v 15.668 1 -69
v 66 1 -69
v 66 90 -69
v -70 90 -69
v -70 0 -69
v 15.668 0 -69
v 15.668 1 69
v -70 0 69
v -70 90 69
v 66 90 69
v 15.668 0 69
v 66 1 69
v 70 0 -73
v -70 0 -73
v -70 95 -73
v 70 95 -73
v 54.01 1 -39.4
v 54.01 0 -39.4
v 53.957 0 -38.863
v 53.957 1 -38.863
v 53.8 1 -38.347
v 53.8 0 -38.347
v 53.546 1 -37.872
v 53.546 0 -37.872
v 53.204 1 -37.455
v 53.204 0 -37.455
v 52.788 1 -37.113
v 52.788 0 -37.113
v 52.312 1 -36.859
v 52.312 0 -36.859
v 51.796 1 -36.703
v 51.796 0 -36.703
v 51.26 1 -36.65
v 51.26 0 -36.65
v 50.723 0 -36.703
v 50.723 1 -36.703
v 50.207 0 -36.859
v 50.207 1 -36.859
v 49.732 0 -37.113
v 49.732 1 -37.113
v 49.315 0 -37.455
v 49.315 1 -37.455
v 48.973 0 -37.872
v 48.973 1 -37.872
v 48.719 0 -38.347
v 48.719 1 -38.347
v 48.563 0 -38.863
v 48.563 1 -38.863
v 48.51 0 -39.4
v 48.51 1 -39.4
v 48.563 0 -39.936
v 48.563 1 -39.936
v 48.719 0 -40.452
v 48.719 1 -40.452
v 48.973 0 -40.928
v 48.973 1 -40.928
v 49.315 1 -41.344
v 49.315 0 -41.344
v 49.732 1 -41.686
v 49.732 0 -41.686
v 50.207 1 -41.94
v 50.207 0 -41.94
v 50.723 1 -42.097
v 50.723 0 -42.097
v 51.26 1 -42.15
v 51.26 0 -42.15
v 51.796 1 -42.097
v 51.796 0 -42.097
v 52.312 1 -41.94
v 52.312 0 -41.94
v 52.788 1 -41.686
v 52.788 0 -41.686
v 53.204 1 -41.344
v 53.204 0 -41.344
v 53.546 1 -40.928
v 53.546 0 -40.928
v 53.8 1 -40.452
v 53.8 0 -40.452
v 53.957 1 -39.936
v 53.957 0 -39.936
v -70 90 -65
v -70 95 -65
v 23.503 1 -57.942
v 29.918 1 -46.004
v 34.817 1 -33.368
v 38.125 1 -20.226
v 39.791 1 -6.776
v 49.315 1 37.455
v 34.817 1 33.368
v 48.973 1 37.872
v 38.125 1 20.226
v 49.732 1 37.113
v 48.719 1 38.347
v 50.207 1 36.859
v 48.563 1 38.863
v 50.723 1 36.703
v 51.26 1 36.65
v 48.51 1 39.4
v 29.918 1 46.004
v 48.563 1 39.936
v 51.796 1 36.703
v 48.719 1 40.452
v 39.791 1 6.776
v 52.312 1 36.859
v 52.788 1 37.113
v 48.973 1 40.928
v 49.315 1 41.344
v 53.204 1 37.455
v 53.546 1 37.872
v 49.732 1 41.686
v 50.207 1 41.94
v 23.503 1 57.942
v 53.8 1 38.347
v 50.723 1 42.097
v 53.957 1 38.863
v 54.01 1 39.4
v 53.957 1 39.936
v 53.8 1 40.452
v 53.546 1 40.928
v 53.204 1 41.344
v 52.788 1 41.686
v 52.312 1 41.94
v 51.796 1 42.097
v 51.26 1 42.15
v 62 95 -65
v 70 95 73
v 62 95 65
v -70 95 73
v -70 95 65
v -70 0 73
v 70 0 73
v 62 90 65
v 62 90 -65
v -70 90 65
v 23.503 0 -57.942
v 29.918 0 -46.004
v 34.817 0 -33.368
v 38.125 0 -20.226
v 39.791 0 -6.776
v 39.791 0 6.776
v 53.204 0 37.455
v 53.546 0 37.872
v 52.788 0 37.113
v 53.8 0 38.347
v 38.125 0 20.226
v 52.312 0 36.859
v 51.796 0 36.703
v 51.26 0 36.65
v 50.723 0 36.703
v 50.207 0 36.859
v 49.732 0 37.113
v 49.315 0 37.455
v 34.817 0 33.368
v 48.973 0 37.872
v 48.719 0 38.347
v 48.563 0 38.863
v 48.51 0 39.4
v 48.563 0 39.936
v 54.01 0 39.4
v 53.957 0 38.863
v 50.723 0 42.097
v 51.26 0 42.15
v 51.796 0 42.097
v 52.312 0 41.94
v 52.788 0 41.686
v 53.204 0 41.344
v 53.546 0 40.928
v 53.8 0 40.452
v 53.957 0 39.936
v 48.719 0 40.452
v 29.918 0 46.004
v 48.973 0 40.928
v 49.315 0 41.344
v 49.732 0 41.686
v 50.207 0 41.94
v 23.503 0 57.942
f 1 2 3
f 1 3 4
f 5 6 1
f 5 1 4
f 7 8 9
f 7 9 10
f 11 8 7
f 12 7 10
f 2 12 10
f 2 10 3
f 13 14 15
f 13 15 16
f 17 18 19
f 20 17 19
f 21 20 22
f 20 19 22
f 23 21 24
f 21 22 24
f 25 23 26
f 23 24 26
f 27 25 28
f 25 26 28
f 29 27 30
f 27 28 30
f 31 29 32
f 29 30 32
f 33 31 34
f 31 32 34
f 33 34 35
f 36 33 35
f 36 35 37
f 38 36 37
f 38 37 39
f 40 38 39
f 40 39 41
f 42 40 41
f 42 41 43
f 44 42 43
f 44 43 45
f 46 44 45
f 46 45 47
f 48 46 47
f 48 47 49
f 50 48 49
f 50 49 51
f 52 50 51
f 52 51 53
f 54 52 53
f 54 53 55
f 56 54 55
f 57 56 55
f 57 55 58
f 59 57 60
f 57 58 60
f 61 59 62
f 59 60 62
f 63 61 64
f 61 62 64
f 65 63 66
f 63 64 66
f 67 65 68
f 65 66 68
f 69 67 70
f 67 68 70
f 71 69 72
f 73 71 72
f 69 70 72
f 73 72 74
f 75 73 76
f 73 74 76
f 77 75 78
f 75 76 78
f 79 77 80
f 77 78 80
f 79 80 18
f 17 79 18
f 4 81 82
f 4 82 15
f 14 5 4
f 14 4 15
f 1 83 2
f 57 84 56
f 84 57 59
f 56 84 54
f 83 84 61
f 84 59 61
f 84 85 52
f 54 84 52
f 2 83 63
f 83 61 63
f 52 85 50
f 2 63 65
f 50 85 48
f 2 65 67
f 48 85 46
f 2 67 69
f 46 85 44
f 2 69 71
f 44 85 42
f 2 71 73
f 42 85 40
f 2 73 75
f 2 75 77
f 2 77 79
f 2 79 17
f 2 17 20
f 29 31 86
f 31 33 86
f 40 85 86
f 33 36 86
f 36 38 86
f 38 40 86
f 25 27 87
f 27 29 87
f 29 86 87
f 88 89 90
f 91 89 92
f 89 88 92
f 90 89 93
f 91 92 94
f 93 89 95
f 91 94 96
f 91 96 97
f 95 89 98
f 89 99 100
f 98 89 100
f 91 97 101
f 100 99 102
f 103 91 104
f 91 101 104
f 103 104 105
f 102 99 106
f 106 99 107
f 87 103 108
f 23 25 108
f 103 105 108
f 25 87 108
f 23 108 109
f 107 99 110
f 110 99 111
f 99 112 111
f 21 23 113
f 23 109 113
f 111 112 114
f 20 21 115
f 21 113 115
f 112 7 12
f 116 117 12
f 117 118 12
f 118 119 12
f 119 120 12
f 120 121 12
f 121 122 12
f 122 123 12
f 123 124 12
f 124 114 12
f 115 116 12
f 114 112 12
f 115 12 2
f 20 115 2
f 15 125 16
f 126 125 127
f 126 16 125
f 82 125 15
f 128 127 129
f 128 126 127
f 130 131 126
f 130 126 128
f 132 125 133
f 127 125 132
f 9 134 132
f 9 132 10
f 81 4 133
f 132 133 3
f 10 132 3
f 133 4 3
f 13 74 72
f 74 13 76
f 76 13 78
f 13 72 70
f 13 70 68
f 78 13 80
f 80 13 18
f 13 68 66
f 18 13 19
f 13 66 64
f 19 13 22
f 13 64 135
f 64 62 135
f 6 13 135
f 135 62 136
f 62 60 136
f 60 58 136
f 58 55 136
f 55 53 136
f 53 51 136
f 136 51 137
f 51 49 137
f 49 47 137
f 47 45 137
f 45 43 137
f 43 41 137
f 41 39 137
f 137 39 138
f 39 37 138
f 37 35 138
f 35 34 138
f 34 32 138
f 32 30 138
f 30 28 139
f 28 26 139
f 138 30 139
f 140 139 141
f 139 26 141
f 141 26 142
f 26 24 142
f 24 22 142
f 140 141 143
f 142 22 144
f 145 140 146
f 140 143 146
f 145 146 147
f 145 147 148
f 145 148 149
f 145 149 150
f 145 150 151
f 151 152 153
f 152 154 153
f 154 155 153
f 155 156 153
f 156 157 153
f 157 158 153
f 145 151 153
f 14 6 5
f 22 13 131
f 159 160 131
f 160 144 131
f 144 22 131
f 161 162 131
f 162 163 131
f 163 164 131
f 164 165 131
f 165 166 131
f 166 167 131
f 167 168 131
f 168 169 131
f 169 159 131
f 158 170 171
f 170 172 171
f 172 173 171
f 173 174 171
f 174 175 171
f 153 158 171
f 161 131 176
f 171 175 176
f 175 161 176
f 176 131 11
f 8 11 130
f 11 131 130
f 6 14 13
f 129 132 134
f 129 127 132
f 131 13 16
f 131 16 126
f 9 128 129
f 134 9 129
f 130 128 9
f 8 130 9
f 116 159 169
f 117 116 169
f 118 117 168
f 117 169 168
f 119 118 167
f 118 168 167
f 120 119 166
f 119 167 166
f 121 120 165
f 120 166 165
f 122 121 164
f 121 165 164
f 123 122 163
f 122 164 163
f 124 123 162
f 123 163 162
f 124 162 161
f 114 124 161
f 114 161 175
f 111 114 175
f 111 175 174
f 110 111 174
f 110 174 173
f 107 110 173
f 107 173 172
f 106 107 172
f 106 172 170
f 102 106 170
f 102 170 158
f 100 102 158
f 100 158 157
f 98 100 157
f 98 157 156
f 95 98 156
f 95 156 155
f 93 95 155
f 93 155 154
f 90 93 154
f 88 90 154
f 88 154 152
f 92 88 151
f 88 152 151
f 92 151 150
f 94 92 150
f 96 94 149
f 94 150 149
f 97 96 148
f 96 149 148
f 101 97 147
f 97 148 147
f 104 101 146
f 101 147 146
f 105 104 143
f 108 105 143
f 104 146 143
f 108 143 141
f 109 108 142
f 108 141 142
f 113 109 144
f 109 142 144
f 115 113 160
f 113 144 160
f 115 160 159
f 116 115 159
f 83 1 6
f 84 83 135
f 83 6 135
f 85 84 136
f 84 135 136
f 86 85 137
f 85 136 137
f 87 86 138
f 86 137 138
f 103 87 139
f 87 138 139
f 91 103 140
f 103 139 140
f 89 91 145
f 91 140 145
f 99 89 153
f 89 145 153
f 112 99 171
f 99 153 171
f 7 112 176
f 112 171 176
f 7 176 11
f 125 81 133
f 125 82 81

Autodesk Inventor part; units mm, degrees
ref_plane "YZ Plane" through (0, 0, 0) normal (1, 0, 0) x (0, 1, 0)
ref_plane "XZ Plane" through (0, 0, 0) normal (0, 1, 0) x (-1, 0, 0)
ref_plane "XY Plane" through (0, 0, 0) normal (0, 0, 1) x (1, 0, 0)
sketch "Sketch4" plane through (0, 0, 0) normal (0, 1, 0) x (-1, 0, 0)
  line L0 (-70, 73) -> (70, 73)
  line L1 (70, -73) -> (-70, -73)
  line L2 (-70, -73) -> (-70, 73)
  line L3 (-66, -69) -> (70, -69)
  line L4 (70, 69) -> (-66, 69)
  line L5 (-66, 69) -> (-66, -69)
  line L6 (70, 73) -> (70, 69)
  line L7 (70, -69) -> (70, -73)
  point P0 (0, 0)
  point P1 (-66, 65)
  dimension "Housing_Length" = 140
  dimension "Housing_Width" = 146
  dimension "d15" = 4
  dimension "d36" = 136
  dimension "d37" = 138
extrude "Extrusion4" add sketch "Sketch4" along normal blind 95
sketch "Sketch6" plane through (0, 95, 0) normal (0, 1, 0) x (1, 0, 0)
  line L0 (70, 73) -> (-70, 73) projected
  line L1 (-70, -69) -> (-70, -73) projected
  line L2 (70, 73) -> (-70, 73)
  line L3 (-70, 73) -> (-70, -73)
  line L4 (-70, -73) -> (70, -73)
  line L5 (70, -73) -> (70, 73)
  line L6 (62, -65) -> (-70, -65)
  line L7 (-70, 65) -> (62, 65)
  line L8 (62, 65) -> (62, -65)
  point P0 (0, 0)
  dimension "Lip_Width" = 8
extrude "Extrusion5" add sketch "Sketch6" against normal blind 5 contours L5 L4 L1 L3 L6 L8 L7 L0
sketch "Sketch10" plane through (0, 0, 0) normal (0, -1, 0) x (1, 0, 0)
  line L0 (66, -69) -> (66, 69) projected
  circle A0 centre (-70, 0) radius 135
  circle A1 centre (-70, 0) radius 110
  line L1 (-70, 73) -> (70, 73) projected
  line L2 (12.2861, 73) -> (70, 73)
  line L3 (70, -73) -> (-70, -73) projected
  line L4 (70, 73) -> (70, -73)
  line L5 (70, -73) -> (12.2861, -73)
  circle A2 centre (-70, 0) radius 127.5
  line L6 (-70, 0) -> (-70, 135)
  circle A3 centre (-70, 127.5) radius 2.75
  circle A4 centre (-144.9426, 103.1497) radius 2.75
  circle A5 centre (-191.2597, 39.3997) radius 2.75
  circle A6 centre (-191.2597, -39.3997) radius 2.75
  circle A7 centre (-144.9426, -103.1497) radius 2.75
  circle A8 centre (-70, -127.5) radius 2.75
  circle A9 centre (4.9426, -103.1497) radius 2.75
  circle A10 centre (51.2597, -39.3997) radius 2.75
  circle A11 centre (51.2597, 39.3997) radius 2.75
  circle A12 centre (4.9426, 103.1497) radius 2.75
  point P0 (0, 0)
  dimension "d52" = 270
  dimension "d57" = 255
  dimension "d53" = 136
  dimension "d54" = 220
  dimension "d58" = 5.5
  dimension "d61" = 360
extrude "Extrusion9" add sketch "Sketch10" against normal blind 1 contours A0 L3 A2 A10 A11 L1 | A0 L1 L4 L3 | A2 A11 A10 L3 A1 L1
properties part number "Galvo Housing-01"
